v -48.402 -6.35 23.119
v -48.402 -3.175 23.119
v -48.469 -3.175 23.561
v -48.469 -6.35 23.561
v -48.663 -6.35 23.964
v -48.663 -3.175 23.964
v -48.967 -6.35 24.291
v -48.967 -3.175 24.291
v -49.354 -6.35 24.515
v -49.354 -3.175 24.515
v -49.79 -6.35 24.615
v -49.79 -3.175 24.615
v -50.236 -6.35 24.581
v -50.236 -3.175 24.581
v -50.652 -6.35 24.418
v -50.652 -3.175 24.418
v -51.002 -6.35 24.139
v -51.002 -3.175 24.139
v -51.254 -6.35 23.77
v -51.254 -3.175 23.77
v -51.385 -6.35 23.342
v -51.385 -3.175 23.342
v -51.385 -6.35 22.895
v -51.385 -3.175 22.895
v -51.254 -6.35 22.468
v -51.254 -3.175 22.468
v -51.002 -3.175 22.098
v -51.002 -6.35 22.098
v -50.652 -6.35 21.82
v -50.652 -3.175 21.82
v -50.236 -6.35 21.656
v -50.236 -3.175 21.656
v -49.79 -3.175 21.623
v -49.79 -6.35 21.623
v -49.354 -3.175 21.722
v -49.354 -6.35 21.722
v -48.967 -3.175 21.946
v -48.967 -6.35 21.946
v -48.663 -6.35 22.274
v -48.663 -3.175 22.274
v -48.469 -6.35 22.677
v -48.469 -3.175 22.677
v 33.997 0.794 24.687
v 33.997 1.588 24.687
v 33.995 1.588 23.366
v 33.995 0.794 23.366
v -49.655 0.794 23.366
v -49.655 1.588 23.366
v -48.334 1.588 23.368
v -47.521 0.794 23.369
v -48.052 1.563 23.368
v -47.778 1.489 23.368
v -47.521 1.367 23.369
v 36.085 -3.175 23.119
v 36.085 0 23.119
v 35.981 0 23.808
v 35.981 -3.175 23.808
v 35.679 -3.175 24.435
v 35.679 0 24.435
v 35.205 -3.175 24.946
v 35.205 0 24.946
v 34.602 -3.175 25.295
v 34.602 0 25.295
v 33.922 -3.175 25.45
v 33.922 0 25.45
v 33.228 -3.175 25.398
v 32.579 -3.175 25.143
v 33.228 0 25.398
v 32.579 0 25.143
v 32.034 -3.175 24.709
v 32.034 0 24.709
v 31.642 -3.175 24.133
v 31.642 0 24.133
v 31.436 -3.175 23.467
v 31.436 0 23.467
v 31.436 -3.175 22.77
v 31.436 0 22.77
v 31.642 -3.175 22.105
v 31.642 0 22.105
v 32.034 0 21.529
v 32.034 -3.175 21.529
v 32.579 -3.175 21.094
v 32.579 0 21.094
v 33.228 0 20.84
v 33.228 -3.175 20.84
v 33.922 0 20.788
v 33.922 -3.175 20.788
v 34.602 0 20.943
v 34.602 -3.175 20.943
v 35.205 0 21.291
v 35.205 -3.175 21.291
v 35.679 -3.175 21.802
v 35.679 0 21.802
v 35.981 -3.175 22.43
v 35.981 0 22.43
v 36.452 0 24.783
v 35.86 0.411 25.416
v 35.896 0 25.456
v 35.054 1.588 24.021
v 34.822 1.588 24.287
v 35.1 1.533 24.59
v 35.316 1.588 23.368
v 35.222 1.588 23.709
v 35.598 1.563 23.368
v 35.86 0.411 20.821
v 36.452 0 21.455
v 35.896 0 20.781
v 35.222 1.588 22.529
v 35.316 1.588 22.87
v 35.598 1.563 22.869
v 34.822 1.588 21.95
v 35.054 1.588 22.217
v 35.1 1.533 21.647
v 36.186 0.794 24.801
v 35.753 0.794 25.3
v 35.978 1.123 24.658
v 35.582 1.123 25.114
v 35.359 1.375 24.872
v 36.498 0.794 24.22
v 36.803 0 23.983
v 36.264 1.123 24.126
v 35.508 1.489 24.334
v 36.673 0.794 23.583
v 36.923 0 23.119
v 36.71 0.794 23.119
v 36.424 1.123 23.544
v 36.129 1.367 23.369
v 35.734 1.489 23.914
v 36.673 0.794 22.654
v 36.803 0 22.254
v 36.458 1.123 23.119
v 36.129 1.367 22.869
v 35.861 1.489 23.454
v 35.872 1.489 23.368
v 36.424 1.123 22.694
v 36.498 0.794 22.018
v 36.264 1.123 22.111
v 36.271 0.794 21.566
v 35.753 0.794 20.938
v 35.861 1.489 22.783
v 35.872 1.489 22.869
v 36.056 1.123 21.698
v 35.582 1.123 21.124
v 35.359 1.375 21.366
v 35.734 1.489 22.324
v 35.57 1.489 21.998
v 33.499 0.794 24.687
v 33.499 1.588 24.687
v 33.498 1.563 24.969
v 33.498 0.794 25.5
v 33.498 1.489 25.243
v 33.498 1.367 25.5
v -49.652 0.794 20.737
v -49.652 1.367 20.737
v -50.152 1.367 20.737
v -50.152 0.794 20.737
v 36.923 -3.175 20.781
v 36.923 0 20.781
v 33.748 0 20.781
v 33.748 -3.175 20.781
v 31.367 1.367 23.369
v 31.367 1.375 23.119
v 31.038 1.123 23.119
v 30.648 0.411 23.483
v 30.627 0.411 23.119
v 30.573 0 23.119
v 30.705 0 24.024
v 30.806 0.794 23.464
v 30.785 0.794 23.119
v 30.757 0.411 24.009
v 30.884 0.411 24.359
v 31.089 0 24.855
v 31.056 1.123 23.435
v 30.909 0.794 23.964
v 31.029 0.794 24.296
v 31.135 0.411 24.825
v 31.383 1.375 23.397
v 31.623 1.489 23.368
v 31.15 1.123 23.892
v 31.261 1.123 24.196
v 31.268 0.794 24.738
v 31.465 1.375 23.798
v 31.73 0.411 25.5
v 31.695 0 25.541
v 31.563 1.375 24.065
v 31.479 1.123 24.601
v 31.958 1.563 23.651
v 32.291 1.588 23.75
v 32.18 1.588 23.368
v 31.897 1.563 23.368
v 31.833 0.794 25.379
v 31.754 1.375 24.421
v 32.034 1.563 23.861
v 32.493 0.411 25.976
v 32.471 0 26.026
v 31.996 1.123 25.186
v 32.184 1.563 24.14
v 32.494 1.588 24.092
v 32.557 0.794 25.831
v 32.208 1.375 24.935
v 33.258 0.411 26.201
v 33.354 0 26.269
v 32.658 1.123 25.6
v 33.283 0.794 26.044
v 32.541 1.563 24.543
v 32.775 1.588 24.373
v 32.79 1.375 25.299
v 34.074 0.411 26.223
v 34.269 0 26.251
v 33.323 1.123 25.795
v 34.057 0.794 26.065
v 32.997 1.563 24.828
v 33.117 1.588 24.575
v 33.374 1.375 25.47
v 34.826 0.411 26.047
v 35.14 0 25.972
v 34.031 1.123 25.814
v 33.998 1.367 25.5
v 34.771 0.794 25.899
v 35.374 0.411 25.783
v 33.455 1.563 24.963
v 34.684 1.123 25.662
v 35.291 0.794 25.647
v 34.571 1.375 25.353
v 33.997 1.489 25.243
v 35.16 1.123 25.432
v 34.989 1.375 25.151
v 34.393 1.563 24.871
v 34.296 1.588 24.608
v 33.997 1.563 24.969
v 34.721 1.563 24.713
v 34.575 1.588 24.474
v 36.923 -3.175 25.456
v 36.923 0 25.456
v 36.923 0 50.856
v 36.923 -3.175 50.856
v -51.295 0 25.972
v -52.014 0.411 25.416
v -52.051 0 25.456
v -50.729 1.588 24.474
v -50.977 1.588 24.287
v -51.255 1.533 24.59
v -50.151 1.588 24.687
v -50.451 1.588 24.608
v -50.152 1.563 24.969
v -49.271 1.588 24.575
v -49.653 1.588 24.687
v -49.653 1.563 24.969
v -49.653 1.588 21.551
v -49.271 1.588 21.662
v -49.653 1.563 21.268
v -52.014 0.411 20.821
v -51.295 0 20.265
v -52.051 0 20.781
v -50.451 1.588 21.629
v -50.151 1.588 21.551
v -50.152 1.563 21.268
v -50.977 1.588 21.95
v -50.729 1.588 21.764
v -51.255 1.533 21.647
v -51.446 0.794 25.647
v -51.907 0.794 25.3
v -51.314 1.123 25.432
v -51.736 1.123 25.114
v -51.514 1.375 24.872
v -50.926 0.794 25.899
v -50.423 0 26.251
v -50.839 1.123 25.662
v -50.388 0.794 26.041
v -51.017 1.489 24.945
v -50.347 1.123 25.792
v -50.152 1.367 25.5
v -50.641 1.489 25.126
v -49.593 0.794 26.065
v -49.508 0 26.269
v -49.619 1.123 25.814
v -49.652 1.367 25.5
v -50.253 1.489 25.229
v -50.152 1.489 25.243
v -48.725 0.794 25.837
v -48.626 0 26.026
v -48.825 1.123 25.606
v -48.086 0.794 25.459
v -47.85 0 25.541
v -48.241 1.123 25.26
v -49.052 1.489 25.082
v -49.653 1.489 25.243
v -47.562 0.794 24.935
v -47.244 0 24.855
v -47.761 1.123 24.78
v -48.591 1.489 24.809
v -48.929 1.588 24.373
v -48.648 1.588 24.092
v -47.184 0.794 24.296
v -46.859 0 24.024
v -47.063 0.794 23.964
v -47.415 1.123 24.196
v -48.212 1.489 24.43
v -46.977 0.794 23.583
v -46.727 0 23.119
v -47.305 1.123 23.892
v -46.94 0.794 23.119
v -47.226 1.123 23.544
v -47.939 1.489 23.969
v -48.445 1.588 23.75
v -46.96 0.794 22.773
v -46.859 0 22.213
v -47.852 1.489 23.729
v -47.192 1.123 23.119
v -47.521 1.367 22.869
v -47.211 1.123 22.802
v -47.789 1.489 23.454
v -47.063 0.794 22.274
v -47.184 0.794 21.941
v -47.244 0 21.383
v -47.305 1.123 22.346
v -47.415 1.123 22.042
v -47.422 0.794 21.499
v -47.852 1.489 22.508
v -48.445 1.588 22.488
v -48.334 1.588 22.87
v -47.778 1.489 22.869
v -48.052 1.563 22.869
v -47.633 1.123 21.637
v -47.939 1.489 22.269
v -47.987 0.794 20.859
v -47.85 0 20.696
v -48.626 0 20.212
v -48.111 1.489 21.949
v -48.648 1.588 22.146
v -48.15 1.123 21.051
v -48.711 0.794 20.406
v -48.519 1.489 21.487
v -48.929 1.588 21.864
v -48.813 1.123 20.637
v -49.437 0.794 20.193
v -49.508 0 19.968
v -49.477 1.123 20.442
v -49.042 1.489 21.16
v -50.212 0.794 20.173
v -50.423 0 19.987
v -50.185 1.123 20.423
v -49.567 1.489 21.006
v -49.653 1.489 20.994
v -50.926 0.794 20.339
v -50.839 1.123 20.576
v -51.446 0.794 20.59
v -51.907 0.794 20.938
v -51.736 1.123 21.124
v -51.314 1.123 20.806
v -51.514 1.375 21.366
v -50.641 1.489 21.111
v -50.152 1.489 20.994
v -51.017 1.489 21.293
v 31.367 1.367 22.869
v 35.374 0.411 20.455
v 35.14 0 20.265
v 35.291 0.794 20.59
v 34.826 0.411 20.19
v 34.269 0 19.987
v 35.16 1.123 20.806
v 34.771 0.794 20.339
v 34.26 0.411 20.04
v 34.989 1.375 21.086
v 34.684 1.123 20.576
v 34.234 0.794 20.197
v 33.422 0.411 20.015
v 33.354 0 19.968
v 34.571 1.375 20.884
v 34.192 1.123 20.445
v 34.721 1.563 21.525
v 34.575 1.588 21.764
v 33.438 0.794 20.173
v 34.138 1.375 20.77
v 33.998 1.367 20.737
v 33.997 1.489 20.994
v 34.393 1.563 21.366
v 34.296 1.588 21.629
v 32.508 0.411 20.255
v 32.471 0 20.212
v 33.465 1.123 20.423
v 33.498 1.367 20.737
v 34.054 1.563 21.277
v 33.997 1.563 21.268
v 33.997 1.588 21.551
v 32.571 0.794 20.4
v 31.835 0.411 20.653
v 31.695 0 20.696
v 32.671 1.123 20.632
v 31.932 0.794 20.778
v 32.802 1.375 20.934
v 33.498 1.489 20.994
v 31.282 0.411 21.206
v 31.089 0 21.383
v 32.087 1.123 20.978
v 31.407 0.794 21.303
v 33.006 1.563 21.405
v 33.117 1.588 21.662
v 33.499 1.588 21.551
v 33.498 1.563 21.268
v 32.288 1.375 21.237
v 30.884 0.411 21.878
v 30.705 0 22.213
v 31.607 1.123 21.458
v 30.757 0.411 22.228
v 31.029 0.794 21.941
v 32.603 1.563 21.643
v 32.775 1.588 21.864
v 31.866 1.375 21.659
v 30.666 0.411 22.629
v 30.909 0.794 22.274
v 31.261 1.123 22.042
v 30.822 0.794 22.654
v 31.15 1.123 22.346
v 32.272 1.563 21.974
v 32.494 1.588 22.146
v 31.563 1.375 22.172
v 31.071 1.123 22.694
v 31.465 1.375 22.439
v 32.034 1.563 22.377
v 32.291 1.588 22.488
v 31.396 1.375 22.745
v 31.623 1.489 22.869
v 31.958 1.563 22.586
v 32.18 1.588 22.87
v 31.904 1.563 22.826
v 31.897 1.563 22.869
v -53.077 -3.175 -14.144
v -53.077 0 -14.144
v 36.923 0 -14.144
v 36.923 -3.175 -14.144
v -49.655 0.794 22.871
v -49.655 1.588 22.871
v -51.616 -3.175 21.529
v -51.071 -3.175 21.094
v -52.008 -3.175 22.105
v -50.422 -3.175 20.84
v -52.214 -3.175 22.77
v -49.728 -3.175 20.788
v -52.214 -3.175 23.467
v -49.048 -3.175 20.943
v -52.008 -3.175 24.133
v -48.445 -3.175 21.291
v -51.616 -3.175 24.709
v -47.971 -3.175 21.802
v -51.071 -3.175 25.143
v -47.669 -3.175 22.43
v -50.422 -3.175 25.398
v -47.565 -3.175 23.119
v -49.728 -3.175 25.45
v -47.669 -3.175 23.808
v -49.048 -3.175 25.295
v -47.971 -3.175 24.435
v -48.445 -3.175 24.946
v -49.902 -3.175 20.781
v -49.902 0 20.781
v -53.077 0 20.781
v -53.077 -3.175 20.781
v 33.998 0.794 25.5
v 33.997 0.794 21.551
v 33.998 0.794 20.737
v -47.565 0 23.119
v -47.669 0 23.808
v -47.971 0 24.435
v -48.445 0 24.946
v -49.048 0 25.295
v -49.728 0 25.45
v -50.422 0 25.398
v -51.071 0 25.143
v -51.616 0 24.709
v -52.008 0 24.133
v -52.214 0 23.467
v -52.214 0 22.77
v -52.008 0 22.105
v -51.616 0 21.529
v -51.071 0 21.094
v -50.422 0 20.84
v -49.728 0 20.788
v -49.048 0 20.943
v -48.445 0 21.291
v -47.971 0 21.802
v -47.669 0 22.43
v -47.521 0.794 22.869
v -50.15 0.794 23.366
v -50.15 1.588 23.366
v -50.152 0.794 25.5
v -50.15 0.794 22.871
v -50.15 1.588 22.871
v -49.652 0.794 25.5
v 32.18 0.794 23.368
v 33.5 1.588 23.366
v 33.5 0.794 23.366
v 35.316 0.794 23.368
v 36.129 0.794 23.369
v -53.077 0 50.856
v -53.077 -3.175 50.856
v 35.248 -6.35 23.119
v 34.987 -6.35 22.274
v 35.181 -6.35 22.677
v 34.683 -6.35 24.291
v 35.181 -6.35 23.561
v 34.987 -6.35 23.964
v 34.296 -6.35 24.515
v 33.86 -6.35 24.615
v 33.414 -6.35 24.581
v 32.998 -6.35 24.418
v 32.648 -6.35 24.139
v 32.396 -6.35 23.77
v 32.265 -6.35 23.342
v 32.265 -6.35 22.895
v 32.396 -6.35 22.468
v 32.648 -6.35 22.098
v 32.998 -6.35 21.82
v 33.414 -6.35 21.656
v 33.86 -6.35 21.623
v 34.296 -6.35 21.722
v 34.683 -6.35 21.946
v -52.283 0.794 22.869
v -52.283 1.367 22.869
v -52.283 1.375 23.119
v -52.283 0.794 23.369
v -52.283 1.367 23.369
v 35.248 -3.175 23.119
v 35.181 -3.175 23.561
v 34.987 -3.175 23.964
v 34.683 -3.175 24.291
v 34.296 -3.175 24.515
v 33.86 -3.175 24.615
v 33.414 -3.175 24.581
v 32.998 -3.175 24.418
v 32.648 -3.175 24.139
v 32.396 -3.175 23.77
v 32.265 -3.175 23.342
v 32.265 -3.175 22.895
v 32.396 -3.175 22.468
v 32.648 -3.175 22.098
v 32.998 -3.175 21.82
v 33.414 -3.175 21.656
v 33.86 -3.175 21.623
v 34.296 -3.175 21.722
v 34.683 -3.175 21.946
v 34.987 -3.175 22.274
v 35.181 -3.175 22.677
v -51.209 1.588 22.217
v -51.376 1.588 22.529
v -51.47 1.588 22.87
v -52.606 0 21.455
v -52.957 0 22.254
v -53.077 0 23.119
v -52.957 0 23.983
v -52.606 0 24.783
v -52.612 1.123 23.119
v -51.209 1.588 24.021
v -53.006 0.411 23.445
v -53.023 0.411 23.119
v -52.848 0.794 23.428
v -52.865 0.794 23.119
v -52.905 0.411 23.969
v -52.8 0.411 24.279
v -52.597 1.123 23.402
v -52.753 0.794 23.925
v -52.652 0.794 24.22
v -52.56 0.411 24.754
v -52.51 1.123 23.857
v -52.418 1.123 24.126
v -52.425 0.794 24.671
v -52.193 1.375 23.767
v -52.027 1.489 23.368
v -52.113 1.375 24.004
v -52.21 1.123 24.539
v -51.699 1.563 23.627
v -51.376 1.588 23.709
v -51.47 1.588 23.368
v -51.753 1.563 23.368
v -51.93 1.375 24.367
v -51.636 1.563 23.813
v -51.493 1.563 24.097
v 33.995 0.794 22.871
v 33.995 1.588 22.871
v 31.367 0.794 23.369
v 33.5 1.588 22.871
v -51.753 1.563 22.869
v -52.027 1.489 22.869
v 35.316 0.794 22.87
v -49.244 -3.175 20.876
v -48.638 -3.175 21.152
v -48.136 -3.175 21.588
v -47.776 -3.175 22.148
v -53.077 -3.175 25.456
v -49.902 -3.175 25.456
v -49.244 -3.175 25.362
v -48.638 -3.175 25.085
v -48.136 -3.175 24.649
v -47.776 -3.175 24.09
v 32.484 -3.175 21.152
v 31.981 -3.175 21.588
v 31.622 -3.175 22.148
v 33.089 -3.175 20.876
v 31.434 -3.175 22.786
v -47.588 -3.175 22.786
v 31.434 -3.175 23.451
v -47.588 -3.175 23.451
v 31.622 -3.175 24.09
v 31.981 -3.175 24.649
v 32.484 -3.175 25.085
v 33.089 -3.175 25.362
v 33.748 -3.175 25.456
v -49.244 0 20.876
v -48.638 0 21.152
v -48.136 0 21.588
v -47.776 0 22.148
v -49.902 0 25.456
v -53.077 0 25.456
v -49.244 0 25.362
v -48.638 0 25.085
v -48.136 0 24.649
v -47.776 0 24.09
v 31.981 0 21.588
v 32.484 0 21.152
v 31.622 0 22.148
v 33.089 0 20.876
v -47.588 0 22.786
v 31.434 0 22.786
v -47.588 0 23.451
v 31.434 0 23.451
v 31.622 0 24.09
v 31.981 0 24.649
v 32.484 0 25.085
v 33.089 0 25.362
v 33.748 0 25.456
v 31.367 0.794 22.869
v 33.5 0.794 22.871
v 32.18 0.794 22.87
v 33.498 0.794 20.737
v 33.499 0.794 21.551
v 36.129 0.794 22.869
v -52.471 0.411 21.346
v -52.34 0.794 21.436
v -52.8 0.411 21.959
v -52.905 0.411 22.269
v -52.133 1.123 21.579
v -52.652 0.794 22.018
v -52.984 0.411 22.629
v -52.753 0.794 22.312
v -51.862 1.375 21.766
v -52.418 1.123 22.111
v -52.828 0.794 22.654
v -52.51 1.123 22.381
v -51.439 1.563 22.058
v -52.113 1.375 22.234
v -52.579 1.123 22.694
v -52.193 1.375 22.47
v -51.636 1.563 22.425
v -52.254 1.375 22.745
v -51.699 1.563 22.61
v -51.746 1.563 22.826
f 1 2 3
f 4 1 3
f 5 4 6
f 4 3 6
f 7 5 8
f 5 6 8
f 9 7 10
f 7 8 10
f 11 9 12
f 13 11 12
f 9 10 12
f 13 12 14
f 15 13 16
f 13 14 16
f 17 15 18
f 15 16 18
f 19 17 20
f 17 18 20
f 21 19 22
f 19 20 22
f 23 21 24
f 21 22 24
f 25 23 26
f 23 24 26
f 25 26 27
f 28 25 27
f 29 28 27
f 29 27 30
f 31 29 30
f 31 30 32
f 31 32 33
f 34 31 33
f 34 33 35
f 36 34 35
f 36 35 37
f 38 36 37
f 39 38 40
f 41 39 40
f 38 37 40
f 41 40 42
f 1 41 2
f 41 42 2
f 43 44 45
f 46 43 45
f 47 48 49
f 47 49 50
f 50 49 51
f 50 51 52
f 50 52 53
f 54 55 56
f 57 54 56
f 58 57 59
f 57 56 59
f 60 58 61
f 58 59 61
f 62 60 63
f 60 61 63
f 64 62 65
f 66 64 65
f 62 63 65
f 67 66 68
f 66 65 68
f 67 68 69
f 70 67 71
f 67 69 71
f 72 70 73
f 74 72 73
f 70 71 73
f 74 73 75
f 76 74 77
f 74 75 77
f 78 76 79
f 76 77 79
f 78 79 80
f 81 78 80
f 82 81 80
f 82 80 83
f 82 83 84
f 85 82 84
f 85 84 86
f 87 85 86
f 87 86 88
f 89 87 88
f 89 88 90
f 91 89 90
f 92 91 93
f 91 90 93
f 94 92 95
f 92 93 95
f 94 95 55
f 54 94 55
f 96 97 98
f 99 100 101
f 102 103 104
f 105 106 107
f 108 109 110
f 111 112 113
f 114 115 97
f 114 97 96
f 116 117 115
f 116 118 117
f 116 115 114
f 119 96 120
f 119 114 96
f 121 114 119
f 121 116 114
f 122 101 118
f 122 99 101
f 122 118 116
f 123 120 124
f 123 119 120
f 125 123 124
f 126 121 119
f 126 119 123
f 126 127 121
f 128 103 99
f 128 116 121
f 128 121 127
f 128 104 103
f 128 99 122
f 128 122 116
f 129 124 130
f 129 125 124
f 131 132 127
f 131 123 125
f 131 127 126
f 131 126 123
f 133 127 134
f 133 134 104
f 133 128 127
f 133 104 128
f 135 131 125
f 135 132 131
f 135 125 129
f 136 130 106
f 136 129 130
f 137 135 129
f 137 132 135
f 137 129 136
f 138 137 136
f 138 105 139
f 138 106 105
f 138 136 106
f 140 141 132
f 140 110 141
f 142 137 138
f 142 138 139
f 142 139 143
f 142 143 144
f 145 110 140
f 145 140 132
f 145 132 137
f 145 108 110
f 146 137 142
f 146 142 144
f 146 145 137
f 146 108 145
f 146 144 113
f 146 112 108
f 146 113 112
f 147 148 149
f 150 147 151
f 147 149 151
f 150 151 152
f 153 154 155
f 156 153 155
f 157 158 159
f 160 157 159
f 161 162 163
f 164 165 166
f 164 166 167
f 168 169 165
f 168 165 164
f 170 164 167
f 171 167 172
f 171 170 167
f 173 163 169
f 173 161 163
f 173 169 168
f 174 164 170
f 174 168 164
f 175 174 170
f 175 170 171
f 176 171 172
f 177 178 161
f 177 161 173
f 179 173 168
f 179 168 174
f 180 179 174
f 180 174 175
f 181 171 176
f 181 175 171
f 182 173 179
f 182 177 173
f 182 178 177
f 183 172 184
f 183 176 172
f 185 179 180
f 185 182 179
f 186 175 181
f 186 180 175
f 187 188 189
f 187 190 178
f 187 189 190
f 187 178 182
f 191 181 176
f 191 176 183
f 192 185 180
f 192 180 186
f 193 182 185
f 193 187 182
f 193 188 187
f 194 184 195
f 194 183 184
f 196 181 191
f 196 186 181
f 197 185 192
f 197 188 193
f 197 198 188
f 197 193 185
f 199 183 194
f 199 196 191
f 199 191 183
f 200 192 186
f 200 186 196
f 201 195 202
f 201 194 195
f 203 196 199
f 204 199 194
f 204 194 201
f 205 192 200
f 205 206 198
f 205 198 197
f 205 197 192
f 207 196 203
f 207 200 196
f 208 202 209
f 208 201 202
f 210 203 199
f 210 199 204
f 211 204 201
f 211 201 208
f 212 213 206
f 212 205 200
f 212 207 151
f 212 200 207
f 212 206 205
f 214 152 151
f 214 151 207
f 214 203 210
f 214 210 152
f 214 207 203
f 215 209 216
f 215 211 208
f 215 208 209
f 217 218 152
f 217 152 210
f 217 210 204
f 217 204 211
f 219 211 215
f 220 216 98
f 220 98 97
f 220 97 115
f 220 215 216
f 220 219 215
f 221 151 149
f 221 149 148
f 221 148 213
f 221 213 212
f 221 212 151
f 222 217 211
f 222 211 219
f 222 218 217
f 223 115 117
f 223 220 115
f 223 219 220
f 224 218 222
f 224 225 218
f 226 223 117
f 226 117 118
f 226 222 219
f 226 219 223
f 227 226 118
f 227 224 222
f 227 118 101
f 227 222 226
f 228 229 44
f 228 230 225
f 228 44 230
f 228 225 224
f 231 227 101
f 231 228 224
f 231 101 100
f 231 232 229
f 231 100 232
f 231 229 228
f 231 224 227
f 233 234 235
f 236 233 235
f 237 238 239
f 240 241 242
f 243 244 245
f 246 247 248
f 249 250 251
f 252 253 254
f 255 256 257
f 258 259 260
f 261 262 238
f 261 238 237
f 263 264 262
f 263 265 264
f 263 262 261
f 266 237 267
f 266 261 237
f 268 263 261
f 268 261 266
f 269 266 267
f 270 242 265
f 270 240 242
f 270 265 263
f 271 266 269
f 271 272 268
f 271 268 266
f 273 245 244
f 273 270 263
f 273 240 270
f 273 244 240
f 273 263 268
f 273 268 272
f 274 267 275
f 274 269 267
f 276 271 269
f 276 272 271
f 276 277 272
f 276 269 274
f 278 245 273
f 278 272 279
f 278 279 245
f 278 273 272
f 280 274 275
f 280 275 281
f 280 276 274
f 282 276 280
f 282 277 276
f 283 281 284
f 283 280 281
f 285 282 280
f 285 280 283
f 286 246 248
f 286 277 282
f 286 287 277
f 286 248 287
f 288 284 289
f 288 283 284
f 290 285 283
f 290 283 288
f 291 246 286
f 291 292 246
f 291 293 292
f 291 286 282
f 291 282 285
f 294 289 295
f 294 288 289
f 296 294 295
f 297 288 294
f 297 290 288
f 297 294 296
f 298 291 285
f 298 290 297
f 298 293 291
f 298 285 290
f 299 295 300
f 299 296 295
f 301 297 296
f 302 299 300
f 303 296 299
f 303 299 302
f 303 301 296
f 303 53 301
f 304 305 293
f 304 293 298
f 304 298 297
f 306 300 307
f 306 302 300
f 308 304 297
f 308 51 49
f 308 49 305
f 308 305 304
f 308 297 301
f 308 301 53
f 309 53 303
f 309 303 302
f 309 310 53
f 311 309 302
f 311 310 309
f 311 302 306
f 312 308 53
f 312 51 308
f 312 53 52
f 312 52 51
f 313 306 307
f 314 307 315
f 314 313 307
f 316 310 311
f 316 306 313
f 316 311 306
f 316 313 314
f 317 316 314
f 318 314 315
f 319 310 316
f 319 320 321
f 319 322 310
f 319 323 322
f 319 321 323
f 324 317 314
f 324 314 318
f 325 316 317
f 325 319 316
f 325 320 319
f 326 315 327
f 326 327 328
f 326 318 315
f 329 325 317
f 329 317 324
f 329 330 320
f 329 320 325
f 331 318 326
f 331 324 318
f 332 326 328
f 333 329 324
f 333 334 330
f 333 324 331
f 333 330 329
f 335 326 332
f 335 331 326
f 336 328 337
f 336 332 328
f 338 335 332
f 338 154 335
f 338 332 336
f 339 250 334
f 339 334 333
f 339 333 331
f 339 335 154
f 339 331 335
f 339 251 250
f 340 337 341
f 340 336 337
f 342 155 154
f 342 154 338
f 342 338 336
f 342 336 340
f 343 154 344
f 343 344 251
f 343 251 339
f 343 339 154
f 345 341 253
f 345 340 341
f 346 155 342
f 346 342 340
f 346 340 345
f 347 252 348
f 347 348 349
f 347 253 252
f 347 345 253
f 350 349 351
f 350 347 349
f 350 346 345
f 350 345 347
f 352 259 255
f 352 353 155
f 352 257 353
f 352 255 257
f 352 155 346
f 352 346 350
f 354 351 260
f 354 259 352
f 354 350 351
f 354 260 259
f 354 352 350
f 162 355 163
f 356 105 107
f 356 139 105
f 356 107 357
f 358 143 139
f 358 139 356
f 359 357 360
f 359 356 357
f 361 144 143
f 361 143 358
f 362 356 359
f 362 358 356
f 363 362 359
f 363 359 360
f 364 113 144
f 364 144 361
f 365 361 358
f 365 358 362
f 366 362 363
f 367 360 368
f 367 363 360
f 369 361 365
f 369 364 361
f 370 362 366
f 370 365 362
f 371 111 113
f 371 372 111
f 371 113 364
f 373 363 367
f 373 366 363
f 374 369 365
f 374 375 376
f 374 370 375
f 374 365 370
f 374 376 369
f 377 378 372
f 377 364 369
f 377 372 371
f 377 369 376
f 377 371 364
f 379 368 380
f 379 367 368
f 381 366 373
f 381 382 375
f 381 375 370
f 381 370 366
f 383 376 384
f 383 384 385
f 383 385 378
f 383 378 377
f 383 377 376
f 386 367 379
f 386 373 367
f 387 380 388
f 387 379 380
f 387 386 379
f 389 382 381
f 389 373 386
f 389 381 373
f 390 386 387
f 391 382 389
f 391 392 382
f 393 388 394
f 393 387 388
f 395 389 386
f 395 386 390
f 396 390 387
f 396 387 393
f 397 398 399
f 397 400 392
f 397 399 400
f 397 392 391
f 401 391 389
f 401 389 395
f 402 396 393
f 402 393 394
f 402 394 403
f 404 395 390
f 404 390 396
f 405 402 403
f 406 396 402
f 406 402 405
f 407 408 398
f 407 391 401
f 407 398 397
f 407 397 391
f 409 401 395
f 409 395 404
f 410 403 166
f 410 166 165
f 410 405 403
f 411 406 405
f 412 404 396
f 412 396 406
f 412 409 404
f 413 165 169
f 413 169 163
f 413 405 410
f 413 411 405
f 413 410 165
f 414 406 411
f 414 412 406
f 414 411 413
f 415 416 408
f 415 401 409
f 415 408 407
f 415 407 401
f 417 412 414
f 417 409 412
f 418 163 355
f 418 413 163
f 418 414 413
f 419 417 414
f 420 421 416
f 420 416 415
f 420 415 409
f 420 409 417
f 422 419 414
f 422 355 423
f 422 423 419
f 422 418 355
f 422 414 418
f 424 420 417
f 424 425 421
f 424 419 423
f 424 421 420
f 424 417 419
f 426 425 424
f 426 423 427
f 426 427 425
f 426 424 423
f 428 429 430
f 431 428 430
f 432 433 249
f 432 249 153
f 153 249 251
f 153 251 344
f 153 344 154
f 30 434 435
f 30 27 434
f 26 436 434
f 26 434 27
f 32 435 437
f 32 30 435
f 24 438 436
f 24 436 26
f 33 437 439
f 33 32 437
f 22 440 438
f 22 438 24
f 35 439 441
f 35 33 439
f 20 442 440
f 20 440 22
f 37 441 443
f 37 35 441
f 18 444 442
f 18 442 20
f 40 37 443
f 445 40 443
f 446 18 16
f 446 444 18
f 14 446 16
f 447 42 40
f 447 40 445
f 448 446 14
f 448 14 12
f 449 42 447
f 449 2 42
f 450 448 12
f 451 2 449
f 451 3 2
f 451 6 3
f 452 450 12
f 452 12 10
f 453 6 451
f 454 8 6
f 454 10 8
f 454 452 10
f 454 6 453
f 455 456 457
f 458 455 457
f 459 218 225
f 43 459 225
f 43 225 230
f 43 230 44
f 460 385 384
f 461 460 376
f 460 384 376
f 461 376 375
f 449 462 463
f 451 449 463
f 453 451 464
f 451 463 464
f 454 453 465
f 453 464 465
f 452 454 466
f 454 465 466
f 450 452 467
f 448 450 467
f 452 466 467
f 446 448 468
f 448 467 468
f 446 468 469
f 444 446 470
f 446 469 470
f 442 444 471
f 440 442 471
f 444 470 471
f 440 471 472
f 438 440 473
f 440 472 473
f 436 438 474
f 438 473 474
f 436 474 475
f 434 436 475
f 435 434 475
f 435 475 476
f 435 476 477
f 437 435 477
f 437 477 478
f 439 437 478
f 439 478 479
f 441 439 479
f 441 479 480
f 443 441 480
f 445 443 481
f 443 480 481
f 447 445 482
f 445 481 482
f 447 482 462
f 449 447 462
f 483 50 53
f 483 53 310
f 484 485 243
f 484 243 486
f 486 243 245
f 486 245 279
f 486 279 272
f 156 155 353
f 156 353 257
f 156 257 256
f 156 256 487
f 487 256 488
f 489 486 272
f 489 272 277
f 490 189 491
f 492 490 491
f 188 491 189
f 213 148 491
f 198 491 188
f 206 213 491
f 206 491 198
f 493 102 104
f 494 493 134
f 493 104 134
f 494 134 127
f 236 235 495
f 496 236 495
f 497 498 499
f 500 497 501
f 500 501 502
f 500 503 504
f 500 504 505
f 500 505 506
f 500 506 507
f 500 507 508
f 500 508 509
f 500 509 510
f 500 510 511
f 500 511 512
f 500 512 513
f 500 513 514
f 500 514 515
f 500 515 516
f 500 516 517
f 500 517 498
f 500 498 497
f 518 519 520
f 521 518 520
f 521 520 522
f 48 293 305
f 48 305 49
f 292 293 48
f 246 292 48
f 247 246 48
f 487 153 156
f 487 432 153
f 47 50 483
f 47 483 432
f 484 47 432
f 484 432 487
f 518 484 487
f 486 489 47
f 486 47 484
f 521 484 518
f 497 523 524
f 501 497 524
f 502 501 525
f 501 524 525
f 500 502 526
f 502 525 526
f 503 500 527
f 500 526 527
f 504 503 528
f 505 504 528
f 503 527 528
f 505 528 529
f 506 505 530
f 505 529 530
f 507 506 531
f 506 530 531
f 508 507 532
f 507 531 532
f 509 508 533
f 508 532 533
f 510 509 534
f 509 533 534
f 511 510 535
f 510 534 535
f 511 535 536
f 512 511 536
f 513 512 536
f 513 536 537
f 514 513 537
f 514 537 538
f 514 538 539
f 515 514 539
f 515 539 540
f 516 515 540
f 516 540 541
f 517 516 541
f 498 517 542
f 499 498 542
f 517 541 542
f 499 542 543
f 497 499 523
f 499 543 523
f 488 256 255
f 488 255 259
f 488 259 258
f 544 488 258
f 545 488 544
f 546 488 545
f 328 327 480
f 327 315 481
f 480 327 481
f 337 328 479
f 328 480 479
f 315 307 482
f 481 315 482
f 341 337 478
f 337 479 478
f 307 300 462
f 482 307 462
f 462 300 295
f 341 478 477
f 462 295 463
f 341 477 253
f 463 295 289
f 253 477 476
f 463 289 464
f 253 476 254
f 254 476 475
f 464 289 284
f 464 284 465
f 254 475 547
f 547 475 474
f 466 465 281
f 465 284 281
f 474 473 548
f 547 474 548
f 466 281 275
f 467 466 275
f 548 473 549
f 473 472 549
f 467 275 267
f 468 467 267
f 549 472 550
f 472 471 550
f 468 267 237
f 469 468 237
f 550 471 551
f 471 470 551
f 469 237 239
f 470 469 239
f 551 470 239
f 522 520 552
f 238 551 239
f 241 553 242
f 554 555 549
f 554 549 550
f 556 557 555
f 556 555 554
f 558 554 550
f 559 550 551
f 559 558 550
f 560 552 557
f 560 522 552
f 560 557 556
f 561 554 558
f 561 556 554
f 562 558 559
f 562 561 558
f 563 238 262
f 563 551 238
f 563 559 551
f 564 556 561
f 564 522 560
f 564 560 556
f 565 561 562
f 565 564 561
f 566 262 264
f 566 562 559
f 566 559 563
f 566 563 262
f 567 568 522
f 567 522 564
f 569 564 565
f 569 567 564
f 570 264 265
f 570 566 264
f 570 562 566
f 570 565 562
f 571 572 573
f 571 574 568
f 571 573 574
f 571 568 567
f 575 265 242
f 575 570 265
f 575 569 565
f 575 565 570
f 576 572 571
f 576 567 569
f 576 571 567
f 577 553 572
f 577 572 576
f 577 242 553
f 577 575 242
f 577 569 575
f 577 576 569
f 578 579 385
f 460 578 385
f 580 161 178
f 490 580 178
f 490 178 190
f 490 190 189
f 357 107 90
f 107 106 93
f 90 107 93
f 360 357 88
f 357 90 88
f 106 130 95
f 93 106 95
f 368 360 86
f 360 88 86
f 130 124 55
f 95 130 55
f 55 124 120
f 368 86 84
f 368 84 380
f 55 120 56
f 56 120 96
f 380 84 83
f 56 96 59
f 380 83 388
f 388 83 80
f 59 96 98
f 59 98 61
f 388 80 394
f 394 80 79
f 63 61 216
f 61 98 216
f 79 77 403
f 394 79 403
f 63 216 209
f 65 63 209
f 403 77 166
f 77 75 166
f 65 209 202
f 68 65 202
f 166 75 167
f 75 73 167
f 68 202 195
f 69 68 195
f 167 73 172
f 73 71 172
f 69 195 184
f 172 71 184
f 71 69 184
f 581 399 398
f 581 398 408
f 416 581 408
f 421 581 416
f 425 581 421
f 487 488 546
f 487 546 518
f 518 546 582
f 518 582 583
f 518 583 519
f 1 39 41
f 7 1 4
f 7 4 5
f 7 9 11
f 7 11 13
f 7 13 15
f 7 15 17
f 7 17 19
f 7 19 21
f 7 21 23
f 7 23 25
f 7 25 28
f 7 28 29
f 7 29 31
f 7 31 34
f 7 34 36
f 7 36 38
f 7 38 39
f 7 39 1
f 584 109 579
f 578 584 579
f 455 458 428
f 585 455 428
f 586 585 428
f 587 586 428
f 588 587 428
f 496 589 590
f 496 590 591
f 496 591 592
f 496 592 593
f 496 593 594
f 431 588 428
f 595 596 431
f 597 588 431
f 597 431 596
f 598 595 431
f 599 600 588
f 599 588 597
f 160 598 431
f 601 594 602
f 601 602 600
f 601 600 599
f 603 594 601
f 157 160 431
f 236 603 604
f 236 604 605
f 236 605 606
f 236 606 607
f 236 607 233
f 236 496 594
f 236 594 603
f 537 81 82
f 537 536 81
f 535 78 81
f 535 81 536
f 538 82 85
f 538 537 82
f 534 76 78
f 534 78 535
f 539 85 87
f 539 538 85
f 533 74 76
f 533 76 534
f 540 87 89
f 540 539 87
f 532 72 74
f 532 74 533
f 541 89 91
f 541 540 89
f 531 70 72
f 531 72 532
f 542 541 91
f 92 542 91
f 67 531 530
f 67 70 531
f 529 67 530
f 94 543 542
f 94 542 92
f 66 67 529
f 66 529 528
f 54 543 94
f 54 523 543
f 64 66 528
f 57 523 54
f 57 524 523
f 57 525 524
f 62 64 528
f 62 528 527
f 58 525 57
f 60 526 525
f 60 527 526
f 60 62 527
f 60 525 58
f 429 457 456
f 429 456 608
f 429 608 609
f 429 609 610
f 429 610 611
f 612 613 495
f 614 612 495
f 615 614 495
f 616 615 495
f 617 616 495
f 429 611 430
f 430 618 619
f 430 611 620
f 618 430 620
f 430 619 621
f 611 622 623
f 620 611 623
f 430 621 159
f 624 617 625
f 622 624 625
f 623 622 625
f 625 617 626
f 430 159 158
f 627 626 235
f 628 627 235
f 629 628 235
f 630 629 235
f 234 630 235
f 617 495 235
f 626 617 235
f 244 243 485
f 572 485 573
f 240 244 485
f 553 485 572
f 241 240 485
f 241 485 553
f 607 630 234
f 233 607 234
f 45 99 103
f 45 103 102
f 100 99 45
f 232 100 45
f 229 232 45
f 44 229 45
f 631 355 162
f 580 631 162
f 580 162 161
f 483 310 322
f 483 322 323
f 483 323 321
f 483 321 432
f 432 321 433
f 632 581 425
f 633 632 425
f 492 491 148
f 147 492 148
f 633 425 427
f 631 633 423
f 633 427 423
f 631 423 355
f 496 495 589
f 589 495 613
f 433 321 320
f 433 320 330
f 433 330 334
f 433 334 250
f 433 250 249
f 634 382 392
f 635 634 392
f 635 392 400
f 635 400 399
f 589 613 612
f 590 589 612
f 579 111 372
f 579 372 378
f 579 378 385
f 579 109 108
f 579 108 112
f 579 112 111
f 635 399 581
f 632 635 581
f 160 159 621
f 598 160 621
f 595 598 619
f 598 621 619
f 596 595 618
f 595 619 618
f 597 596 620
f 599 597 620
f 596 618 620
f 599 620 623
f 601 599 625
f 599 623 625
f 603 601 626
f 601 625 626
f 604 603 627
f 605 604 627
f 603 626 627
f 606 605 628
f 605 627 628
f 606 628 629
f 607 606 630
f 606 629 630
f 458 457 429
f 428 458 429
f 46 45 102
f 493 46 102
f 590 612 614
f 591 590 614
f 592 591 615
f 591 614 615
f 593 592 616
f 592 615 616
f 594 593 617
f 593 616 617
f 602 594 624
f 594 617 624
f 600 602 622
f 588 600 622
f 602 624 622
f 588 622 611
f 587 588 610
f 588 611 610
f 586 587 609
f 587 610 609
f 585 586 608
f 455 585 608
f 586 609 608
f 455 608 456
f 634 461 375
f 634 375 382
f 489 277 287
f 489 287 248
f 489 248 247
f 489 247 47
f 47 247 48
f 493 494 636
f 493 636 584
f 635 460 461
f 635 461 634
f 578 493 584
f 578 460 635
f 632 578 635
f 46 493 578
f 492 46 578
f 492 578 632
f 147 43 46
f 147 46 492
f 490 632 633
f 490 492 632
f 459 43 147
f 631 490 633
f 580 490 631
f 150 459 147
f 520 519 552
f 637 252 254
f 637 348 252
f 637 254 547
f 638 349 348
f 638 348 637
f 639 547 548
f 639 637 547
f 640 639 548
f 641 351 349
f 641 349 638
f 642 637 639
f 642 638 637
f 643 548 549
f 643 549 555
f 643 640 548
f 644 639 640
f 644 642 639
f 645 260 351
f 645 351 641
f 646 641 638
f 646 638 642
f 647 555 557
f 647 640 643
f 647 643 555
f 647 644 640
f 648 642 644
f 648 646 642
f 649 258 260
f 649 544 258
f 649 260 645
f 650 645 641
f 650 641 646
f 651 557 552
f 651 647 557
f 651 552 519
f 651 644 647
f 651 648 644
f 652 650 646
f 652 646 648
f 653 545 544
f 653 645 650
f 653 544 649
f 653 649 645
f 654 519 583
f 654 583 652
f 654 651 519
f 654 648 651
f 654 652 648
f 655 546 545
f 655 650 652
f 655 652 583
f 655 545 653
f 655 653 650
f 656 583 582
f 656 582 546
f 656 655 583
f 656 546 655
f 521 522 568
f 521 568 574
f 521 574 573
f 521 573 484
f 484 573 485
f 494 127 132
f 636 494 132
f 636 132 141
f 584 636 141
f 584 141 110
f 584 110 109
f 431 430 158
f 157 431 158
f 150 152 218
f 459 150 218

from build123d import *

# Parameters (mm, degrees)
F1_DEPTH  = 3.175
F3_DEPTH  = 1.5875
F4_R      = 1.58749
F4_2_R    = 1.58749
F6_DEPTH  = 0.79375
F8_R      = 2.3375
F9_DEPTH  = 3.175
F7_R      = 2.3375
F11_R     = 1.5
F12_DEPTH = 3.175
F10_R     = 1.5


# Not quite as in the source:
# - a fillet or chamfer is up to 0.001 mm smaller than in the source, because OpenCascade refuses the exact size


with BuildPart() as f1:
    # F0 (on Front) → F1 (new body)
    with BuildSketch(Plane.XZ):
        with BuildLine():
            Line((36.9228013605, 50.8562061697), (-53.0771986395, 50.8562061697))
            Line((-53.0771986395, 50.8562061697), (-53.0771986395, 25.4562061697))
            Line((-53.0771986395, 25.4562061697), (-49.9021986395, 25.4562061697))
            ThreePointArc((-49.9021986395, 25.4562061697), (-47.5646986395, 23.1187061697), (-49.9021986395, 20.7812061697))
            Line((-49.9021986395, 20.7812061697), (-53.0771986395, 20.7812061697))
            Line((-53.0771986395, 20.7812061697), (-53.0771986395, -14.1437938303))
            Line((-53.0771986395, -14.1437938303), (36.9228013605, -14.1437938303))
            Line((36.9228013605, -14.1437938303), (36.9228013605, 20.7812061697))
            Line((36.9228013605, 20.7812061697), (33.7478013605, 20.7812061697))
            ThreePointArc((33.7478013605, 20.7812061697), (31.4103013605, 23.1187061697), (33.7478013605, 25.4562061697))
            Line((33.7478013605, 25.4562061697), (36.9228013605, 25.4562061697))
            Line((36.9228013605, 25.4562061697), (36.9228013605, 50.8562061697))
        make_face()
    extrude(amount=F1_DEPTH)


with BuildPart() as f3:
    # F2 (on face) → F3 (new body)
    with BuildSketch(Plane(origin=(0, 0, 0), x_dir=(-1, 0, 0), z_dir=(0, 1, 0))):
        with BuildLine():
            Line((-33.7478013605, 25.4562061697), (-35.8964564631, 25.4562061697))
            ThreePointArc((-35.8964564631, 25.4562061697), (-36.9228013605, 23.1187061697), (-35.8964564631, 20.7812061697))
            Line((-35.8964564631, 20.7812061697), (-33.7478013605, 20.7812061697))
            ThreePointArc((-33.7478013605, 20.7812061697), (-31.4103013605, 23.1187061697), (-33.7478013605, 25.4562061697))
        make_face()
        with BuildLine():
            ThreePointArc((-35.8964564631, 20.7812061697), (-32.4713521744, 20.211593775), (-30.5728013605, 23.1187061697))
            ThreePointArc((-30.5728013605, 23.1187061697), (-32.4713521744, 26.0258185644), (-35.8964564631, 25.4562061697))
            Line((-35.8964564631, 25.4562061697), (-33.7478013605, 25.4562061697))
            ThreePointArc((-33.7478013605, 25.4562061697), (-31.4103013605, 23.1187061697), (-33.7478013605, 20.7812061697))
            Line((-33.7478013605, 20.7812061697), (-35.8964564631, 20.7812061697))
        make_face()
    extrude(amount=F3_DEPTH)

    # F4 (radius 1.5875 in the source; OpenCascade refuses exactly that, so slightly less here)
    f4_edges = [f3.edges().sort_by_distance(p)[0] for p in [
        (31.599146, 1.5875, 25.456206),
    ]]
    fillet(f4_edges, radius=F4_R)


with BuildPart() as f3b:
    # F2 (on face) → F3, piece 2 (new body)
    with BuildSketch(Plane(origin=(0, 0, 0), x_dir=(-1, 0, 0), z_dir=(0, 1, 0))):
        with BuildLine():
            ThreePointArc((53.0771986395, 23.1187061697), (52.8093110342, 24.3951553557), (52.0508537421, 25.4562061697))
            Line((52.0508537421, 25.4562061697), (49.9021986395, 25.4562061697))
            ThreePointArc((49.9021986395, 25.4562061697), (47.5646986395, 23.1187061697), (49.9021986395, 20.7812061697))
            Line((49.9021986395, 20.7812061697), (52.0508537421, 20.7812061697))
            ThreePointArc((52.0508537421, 20.7812061697), (52.8093110342, 21.8422569836), (53.0771986395, 23.1187061697))
        make_face()
        with BuildLine():
            Line((49.9021986395, 25.4562061697), (52.0508537421, 25.4562061697))
            ThreePointArc((52.0508537421, 25.4562061697), (46.7271986395, 23.1187061697), (52.0508537421, 20.7812061697))
            Line((52.0508537421, 20.7812061697), (49.9021986395, 20.7812061697))
            ThreePointArc((49.9021986395, 20.7812061697), (47.5646986395, 23.1187061697), (49.9021986395, 25.4562061697))
        make_face()
    extrude(amount=F3_DEPTH)

    # F4#2 (radius 1.5875 in the source; OpenCascade refuses exactly that, so slightly less here)
    f4_2_edges = [f3b.edges().sort_by_distance(p)[0] for p in [
        (-46.727199, 1.5875, 23.118706),
    ]]
    fillet(f4_2_edges, radius=F4_2_R)


with BuildPart() as f6_tool:
    # F5 (on face) → F6 (new body)
    with BuildSketch(Plane(origin=(0, 1.5875, 0), x_dir=(-1, 0, 0), z_dir=(0, 1, 0))):
        with BuildLine():
            Line((-33.5003139871, 23.3661935431), (-33.4987591805, 24.6865601146))
            ThreePointArc((-33.4987591805, 24.6865601146), (-33.7478013605, 24.7062161697), (-33.9968435405, 24.6865601146))
            Line((-33.9968435405, 24.6865601146), (-33.9952887339, 23.3661935431))
            Line((-33.9952887339, 23.3661935431), (-35.3156553054, 23.3677483496))
            ThreePointArc((-35.3156553054, 23.3677483496), (-35.3353113605, 23.1187061697), (-35.3156553054, 22.8696639897))
            Line((-35.3156553054, 22.8696639897), (-33.9952887339, 22.8712187962))
            Line((-33.9952887339, 22.8712187962), (-33.9968435405, 21.5508522247))
            ThreePointArc((-33.9968435405, 21.5508522247), (-33.7478013605, 21.5311961697), (-33.4987591805, 21.5508522247))
            Line((-33.4987591805, 21.5508522247), (-33.5003139871, 22.8712187962))
            Line((-33.5003139871, 22.8712187962), (-32.1799474155, 22.8696639897))
            ThreePointArc((-32.1799474155, 22.8696639897), (-32.1652130034, 22.9937978354), (-32.1602913605, 23.1187061697))
            ThreePointArc((-32.1602913605, 23.1187061697), (-32.1652130034, 23.243614504), (-32.1799474155, 23.3677483496))
            Line((-32.1799474155, 23.3677483496), (-33.5003139871, 23.3661935431))
        make_face()
        with BuildLine():
            Line((-33.4978013605, 25.4999561697), (-33.7478013605, 25.4999561697))
            Line((-33.7478013605, 25.4999561697), (-33.9978013605, 25.4999561697))
            Line((-33.9978013605, 25.4999561697), (-33.9968435405, 24.6865601146))
            ThreePointArc((-33.9968435405, 24.6865601146), (-33.7478013605, 24.7062161697), (-33.4987591805, 24.6865601146))
            Line((-33.4987591805, 24.6865601146), (-33.4978013605, 25.4999561697))
        make_face()
        with BuildLine():
            Line((-31.3665513605, 23.3687061697), (-32.1799474155, 23.3677483496))
            ThreePointArc((-32.1799474155, 23.3677483496), (-32.1652130034, 23.243614504), (-32.1602913605, 23.1187061697))
            ThreePointArc((-32.1602913605, 23.1187061697), (-32.1652130034, 22.9937978354), (-32.1799474155, 22.8696639897))
            Line((-32.1799474155, 22.8696639897), (-31.3665513605, 22.8687061697))
            Line((-31.3665513605, 22.8687061697), (-31.3665513605, 23.1187061697))
            Line((-31.3665513605, 23.1187061697), (-31.3665513605, 23.3687061697))
        make_face()
        with BuildLine():
            ThreePointArc((-33.4987591805, 21.5508522247), (-33.7478013605, 21.5311961697), (-33.9968435405, 21.5508522247))
            Line((-33.9968435405, 21.5508522247), (-33.9978013605, 20.7374561697))
            Line((-33.9978013605, 20.7374561697), (-33.7478013605, 20.7374561697))
            Line((-33.7478013605, 20.7374561697), (-33.4978013605, 20.7374561697))
            Line((-33.4978013605, 20.7374561697), (-33.4987591805, 21.5508522247))
        make_face()
        with BuildLine():
            ThreePointArc((-35.3156553054, 22.8696639897), (-35.3353113605, 23.1187061697), (-35.3156553054, 23.3677483496))
            Line((-35.3156553054, 23.3677483496), (-36.1290513605, 23.3687061697))
            Line((-36.1290513605, 23.3687061697), (-36.1290513605, 23.1187061697))
            Line((-36.1290513605, 23.1187061697), (-36.1290513605, 22.8687061697))
            Line((-36.1290513605, 22.8687061697), (-35.3156553054, 22.8696639897))
        make_face()
        Polygon((49.6521986395, 20.7374561697), (49.9021986395, 20.7374561697), (50.1521986395, 20.7374561697), (50.1496860129, 22.8712187962), (52.2834486395, 22.8687061697), (52.2834486395, 23.1187061697), (52.2834486395, 23.3687061697), (50.1496860129, 23.3661935431), (50.1521986395, 25.4999561697), (49.9021986395, 25.4999561697), (49.6521986395, 25.4999561697), (49.6547112661, 23.3661935431), (47.5209486395, 23.3687061697), (47.5209486395, 23.1187061697), (47.5209486395, 22.8687061697), (49.6547112661, 22.8712187962), align=None)
    extrude(amount=-F6_DEPTH)


with BuildPart() as f3_1:
    add(f3.part)

    # F6: cut by f6_tool
    add(f6_tool.part, mode=Mode.SUBTRACT)

    # F7 (on face) → F9, piece 2 (join, through all)
    with BuildSketch(Plane.XZ):
        with Locations((33.7478013605, 23.1187061697)):
            Circle(F7_R)
    extrude(amount=F9_DEPTH)

    # F10 (on face) → F12, piece 2 (join)
    with BuildSketch(Plane.XZ.offset(3.175)):
        with Locations((33.7478013605, 23.1187061697)):
            Circle(F10_R)
    extrude(amount=F12_DEPTH)


with BuildPart() as f3b_1:
    add(f3b.part)

    # F6: cut by f6_tool
    add(f6_tool.part, mode=Mode.SUBTRACT)

    # F8 (on face) → F9 (join, through all)
    with BuildSketch(Plane.XZ):
        with Locations((-49.9021986395, 23.1187061697)):
            Circle(F8_R)
    extrude(amount=F9_DEPTH)

    # F11 (on face) → F12 (join)
    with BuildSketch(Plane.XZ.offset(3.175)):
        with Locations((-49.9021986395, 23.1187061697)):
            Circle(F11_R)
    extrude(amount=F12_DEPTH)


solid = Compound([f1.part, f3_1.part, f3b_1.part])
